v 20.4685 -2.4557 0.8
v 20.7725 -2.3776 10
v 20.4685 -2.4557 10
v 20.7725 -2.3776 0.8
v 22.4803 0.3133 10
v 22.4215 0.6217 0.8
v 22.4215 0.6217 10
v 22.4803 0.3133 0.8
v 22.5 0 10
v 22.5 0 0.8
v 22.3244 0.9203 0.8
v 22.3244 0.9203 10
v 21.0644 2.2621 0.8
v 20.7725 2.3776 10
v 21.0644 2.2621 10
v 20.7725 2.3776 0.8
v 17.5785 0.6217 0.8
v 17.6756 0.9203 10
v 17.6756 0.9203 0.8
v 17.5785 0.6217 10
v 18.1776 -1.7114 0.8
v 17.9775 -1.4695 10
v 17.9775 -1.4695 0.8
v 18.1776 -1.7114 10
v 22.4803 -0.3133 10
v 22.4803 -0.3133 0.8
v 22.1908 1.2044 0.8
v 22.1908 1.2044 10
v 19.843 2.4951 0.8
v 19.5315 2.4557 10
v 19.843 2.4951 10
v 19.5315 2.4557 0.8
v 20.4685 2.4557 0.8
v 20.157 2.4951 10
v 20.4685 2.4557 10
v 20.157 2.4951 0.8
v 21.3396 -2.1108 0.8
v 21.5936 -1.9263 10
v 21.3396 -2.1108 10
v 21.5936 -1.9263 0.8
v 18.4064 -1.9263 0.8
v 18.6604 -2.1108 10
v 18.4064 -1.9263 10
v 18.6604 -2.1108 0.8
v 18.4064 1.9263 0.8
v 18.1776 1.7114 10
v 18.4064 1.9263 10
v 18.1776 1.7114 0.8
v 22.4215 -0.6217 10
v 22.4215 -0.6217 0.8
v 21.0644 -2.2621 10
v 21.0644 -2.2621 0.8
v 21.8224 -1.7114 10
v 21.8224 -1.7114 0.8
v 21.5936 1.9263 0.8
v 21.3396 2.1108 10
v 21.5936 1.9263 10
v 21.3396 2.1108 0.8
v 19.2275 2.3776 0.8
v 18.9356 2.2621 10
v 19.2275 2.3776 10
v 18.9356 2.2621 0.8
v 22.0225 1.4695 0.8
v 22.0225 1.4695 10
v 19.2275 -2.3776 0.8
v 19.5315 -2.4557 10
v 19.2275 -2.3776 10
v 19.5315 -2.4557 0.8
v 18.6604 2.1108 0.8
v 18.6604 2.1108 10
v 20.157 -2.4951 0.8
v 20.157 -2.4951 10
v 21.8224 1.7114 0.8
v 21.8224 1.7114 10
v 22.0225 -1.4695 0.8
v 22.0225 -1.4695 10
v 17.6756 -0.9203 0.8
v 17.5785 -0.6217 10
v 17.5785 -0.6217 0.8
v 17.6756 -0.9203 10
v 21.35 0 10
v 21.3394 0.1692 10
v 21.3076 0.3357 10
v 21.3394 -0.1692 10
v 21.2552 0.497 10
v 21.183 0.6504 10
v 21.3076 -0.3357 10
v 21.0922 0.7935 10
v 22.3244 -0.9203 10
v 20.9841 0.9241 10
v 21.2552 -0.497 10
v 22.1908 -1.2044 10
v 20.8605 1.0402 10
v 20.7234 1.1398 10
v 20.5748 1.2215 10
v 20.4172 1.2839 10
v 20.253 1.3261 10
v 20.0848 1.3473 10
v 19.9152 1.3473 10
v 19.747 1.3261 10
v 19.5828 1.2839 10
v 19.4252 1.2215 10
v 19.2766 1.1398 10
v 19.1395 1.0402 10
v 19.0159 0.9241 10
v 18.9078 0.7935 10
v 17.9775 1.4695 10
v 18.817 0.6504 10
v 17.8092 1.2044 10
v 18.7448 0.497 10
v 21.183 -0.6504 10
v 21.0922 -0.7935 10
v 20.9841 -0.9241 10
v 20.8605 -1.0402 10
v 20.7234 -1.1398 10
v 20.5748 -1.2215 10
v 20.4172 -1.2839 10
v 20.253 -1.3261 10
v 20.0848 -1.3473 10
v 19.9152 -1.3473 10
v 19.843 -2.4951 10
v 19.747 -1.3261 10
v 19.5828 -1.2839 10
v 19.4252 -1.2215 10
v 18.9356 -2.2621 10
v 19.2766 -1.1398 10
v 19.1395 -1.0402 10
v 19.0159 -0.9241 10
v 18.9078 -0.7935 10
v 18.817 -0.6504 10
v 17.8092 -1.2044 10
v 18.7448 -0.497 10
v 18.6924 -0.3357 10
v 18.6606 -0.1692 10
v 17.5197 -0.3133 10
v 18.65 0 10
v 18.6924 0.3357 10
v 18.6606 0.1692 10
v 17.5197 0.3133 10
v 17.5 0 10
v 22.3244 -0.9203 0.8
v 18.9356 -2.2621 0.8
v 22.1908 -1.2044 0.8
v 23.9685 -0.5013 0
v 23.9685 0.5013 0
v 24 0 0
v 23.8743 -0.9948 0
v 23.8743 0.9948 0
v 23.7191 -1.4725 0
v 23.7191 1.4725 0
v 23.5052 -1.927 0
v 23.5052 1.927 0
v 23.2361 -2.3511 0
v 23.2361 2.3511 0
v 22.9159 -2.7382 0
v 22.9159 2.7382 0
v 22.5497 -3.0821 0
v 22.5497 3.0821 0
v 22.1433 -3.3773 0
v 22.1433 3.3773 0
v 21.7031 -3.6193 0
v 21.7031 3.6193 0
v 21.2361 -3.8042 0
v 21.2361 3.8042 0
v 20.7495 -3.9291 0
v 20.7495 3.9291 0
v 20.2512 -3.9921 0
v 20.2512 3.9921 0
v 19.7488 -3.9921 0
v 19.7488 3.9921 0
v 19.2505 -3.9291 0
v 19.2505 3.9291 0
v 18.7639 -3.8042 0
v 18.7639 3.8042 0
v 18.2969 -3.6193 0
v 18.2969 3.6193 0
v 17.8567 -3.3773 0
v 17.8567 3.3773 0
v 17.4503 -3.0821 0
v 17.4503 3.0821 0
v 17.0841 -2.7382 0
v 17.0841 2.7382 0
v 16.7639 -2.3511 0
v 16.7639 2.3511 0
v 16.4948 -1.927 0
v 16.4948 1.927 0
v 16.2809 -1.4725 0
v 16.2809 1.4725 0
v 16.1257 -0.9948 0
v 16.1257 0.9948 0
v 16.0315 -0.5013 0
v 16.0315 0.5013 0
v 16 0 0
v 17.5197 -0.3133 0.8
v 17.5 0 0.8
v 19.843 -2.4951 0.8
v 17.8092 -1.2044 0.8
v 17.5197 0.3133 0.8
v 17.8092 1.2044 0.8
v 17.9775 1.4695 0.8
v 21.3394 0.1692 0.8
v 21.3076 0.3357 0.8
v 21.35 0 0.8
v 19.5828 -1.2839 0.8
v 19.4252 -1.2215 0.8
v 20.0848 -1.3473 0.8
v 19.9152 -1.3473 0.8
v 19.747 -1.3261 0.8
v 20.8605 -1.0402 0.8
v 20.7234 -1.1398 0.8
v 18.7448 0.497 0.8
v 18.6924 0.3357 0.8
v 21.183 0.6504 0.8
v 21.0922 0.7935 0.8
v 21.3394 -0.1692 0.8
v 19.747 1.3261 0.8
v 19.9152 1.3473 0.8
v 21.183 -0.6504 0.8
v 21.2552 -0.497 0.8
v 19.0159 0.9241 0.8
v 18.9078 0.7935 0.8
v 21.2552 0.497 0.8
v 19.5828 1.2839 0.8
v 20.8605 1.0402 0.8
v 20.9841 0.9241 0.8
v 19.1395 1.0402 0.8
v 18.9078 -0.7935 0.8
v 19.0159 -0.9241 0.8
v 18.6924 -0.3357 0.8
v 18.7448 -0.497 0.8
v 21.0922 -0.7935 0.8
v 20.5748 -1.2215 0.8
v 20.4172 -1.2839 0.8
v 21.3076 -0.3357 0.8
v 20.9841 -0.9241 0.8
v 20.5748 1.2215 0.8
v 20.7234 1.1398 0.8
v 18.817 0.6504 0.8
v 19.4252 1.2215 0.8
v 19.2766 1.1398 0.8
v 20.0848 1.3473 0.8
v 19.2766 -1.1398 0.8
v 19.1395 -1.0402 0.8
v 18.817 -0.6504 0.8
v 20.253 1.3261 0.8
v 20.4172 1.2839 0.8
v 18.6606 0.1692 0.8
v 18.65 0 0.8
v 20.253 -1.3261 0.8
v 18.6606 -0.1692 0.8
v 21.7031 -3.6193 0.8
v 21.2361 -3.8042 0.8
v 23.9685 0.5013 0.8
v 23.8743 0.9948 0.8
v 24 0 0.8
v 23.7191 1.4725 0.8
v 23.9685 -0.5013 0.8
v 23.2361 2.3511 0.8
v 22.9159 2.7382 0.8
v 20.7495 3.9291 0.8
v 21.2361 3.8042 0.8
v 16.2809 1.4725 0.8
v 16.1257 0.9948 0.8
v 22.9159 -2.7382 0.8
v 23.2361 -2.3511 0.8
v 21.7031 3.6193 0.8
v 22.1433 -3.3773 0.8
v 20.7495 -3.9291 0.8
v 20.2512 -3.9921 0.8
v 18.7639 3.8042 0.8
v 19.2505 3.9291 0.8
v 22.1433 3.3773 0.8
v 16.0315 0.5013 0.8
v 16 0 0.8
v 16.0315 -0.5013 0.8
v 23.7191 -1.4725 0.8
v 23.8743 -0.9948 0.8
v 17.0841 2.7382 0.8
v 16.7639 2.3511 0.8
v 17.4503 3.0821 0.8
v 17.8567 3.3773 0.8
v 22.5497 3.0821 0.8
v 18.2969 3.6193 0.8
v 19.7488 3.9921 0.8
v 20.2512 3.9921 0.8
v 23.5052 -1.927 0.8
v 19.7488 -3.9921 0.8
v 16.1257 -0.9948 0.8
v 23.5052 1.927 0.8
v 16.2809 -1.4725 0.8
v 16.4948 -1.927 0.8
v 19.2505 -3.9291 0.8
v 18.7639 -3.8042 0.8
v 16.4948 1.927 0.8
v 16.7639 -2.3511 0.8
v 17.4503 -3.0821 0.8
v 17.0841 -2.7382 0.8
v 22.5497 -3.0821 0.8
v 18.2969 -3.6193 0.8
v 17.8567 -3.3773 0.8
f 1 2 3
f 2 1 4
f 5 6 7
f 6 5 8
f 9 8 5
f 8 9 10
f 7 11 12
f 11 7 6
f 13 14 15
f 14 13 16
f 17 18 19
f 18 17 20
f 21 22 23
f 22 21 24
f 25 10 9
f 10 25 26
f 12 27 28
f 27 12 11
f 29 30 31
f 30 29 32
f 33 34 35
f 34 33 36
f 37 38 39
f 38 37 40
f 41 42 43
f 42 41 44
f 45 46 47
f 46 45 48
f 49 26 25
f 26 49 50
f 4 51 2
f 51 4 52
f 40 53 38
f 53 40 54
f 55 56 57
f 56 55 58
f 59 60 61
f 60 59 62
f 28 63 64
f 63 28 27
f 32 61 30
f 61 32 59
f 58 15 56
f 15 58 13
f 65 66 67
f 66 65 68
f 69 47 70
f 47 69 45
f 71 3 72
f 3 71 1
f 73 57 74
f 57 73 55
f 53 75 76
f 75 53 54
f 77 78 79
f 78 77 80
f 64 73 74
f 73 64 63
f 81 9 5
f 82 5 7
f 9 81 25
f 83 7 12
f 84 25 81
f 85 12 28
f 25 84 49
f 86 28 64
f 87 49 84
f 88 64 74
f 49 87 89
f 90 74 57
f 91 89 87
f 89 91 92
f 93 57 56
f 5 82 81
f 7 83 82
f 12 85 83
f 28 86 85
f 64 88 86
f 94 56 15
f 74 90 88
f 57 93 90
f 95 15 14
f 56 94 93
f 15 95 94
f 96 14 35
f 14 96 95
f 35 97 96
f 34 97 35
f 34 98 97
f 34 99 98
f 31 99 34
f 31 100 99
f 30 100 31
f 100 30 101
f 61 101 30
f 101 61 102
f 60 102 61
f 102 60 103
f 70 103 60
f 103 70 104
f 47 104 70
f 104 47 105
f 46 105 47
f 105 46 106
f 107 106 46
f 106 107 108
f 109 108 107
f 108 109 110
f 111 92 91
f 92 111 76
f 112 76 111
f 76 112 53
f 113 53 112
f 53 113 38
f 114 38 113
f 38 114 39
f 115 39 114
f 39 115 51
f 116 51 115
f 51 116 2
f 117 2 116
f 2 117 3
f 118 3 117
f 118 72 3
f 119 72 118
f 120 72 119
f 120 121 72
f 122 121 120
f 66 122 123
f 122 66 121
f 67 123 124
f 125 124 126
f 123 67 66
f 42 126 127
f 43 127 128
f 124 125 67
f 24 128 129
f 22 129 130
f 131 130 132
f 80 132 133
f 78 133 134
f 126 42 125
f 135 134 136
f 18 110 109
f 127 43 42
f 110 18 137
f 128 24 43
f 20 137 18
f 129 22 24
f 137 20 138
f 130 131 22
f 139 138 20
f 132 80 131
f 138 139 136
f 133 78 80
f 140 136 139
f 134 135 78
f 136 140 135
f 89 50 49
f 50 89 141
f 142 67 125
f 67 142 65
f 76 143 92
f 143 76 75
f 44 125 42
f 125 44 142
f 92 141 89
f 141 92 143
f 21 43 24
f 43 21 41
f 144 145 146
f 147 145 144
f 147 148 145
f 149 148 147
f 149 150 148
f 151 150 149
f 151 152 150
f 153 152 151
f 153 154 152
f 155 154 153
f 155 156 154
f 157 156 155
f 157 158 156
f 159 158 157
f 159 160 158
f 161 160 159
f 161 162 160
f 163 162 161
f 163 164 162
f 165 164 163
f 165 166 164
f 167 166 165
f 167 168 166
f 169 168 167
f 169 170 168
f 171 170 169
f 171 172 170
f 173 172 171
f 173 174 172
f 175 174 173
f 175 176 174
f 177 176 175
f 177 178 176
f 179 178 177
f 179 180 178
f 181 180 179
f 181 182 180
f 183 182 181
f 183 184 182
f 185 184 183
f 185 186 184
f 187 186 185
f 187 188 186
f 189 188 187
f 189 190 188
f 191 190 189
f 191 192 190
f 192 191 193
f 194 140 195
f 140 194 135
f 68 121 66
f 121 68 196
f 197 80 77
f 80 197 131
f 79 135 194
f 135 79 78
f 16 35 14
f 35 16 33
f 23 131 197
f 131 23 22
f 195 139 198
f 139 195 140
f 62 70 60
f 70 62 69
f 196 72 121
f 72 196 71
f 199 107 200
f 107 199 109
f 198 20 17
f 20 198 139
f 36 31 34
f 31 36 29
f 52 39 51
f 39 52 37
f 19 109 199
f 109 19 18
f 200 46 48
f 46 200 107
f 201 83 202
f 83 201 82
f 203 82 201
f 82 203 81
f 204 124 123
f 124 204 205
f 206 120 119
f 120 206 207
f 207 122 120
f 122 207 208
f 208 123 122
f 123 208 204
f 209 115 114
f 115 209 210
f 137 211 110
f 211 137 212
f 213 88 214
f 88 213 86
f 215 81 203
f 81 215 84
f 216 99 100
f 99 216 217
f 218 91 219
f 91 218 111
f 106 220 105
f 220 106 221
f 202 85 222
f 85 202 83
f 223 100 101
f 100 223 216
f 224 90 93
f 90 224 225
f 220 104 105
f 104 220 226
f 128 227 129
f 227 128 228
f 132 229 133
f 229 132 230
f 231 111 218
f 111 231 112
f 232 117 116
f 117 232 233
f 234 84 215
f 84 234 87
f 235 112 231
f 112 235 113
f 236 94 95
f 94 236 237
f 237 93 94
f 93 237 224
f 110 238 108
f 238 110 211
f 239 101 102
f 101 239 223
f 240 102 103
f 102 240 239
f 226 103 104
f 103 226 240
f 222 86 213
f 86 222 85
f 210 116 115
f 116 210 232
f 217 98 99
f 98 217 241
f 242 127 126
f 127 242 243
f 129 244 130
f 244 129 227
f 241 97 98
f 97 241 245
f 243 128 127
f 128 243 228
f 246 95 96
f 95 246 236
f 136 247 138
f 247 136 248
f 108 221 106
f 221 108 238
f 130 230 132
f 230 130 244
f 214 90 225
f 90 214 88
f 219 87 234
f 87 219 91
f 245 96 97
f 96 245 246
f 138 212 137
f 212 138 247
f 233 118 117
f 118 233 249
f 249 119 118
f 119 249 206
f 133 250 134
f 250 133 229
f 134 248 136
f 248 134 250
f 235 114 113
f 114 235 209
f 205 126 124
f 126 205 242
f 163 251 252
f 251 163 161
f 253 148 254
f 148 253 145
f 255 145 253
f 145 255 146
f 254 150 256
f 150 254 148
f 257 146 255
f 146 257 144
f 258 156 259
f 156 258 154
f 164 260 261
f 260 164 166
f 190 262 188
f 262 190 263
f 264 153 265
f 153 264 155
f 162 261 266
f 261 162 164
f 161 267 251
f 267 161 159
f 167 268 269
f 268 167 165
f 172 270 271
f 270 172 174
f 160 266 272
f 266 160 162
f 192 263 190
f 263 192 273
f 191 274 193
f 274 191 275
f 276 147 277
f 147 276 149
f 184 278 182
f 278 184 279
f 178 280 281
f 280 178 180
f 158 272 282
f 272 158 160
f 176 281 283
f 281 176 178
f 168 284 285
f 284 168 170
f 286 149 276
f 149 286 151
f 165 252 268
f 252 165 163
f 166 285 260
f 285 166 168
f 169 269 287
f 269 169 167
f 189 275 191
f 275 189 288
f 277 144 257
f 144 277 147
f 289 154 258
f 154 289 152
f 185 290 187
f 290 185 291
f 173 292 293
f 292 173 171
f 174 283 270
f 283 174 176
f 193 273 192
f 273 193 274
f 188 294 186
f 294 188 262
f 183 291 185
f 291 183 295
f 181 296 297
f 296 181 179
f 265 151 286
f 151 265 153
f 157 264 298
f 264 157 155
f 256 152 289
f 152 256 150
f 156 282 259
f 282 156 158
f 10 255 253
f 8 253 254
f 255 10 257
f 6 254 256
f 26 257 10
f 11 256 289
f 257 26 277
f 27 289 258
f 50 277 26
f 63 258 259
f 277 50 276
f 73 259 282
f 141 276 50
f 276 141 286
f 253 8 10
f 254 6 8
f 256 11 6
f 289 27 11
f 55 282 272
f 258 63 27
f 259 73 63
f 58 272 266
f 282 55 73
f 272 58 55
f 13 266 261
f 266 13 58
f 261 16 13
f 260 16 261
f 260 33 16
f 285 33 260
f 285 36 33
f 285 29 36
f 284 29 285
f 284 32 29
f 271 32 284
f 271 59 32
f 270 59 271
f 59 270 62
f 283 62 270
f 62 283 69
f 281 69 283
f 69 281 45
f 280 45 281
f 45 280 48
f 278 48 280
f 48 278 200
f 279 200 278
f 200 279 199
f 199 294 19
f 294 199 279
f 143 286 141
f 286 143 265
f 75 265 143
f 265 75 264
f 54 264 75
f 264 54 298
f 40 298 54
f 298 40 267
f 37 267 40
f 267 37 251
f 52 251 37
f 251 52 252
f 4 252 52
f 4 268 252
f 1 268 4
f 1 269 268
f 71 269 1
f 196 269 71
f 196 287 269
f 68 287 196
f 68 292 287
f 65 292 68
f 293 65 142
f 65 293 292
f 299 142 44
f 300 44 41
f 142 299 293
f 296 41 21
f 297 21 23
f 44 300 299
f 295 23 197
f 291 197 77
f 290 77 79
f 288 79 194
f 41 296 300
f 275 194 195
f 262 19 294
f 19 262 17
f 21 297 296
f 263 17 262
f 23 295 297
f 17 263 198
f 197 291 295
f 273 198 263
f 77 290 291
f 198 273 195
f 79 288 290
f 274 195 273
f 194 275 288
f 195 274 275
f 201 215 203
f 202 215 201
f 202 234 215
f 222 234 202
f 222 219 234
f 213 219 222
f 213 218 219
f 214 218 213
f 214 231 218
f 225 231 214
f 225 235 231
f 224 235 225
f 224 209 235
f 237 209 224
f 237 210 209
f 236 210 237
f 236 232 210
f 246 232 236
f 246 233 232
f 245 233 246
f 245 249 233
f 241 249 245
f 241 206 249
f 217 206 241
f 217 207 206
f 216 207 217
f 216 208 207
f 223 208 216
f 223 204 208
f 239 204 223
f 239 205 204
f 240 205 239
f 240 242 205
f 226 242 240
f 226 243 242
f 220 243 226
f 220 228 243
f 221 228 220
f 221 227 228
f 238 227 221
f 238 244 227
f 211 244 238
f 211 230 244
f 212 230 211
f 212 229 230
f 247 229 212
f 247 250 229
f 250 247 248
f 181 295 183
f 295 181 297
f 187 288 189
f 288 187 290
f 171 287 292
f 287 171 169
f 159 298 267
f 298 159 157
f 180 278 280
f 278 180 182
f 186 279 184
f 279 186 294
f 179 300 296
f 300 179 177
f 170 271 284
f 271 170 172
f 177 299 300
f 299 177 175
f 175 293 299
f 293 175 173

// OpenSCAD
translate([20,0.,0])
	cylinder(0.8,4,4, $fn=50);
translate([20,0.,0])
difference(){
		cylinder(10,2.5,2.5, $fn=50);
		cylinder(12,1.35,1.35, $fn=50);
}
